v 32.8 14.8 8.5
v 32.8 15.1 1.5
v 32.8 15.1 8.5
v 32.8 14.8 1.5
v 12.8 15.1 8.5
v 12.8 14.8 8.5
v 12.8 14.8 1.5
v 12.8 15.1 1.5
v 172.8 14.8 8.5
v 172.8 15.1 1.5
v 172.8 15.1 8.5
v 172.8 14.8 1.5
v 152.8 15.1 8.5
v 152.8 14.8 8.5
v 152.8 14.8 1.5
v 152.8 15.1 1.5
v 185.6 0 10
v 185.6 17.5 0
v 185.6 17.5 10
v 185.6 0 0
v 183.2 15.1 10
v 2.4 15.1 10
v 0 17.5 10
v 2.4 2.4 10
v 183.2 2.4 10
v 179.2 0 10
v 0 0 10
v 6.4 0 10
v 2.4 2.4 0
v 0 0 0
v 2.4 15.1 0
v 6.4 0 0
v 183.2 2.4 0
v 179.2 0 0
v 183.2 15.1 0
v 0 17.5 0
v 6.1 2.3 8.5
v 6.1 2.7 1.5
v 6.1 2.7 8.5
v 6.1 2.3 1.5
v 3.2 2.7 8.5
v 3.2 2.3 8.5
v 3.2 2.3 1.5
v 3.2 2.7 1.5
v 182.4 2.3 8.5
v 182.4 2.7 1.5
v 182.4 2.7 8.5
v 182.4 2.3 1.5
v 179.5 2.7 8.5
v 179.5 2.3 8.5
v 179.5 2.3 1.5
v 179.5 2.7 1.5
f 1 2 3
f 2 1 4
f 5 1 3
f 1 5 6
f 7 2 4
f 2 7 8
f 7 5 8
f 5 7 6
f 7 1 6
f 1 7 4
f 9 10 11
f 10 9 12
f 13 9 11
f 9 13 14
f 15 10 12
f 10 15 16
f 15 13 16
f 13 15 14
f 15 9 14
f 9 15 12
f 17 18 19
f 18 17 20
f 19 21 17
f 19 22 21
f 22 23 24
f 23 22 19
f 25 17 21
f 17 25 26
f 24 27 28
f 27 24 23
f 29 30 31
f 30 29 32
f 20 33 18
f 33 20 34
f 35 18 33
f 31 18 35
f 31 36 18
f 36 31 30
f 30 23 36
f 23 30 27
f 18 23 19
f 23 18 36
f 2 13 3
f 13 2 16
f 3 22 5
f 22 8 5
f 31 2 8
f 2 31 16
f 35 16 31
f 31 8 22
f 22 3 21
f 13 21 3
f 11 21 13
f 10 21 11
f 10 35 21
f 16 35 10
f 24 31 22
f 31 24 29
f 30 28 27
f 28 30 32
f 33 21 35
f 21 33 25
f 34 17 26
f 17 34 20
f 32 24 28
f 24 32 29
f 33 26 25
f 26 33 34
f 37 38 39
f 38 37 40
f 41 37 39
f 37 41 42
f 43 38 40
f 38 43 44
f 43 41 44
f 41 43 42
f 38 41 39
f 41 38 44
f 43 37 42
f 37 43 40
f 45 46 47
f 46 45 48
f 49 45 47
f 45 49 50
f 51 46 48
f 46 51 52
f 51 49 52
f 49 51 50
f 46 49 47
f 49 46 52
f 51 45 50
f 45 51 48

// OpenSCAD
// SUPERSEDED BEFORE PRINT — DO NOT PRINT.
// Unified full-width retainer fit test for the populated electronics tray.
// Replaced by vertical-service-stand-front-retainer-fit-test.scad after the
// installation direction and screw-tab geometry were clarified.

$fn = 32;

tray_w = 180;
tray_t = 4;
upright_t = 8;

wall = 2.4;
width_clearance = 0.8;
depth_clearance = 0.7;
clip_h = 10;

inside_w = tray_w + width_clearance;
outside_w = inside_w + 2 * wall;
inside_depth = tray_t + upright_t + depth_clearance;
outside_depth = inside_depth + 2 * wall;

// Both populated edge bays leave 6 mm between the tray edge and the PCB.
// A 4 mm front tab therefore retains 2 mm nominal PCB clearance.
front_tab = 4;
retention_rib = 0.3;

// Approximate support centres relative to the left tray edge. Rear pads press
// only over the two black uprights; the connecting rear beam distributes load.
support_centres = [20, 160];
support_pad_w = 20;

module left_front_tab() {
    // Angled inner edge acts as a lead-in while the frame is pushed from the
    // rear toward the populated tray.
    linear_extrude(height = clip_h)
        polygon([
            [0, 0],
            [wall + front_tab, 0],
            [wall, wall],
            [0, wall]
        ]);
}

module unified_retainer_fit_test() {
    union() {
        // Full rear beam and two outer side walls form the main U.
        translate([0, wall + inside_depth, 0])
            cube([outside_w, wall, clip_h]);
        cube([wall, outside_depth, clip_h]);
        translate([outside_w - wall, 0, 0])
            cube([wall, outside_depth, clip_h]);

        // Short front tabs touch only the empty 6 mm tray-edge margins.
        left_front_tab();
        translate([outside_w, 0, 0]) mirror([1, 0, 0]) left_front_tab();

        // Front friction ribs stay inside the same clear edge margins.
        translate([wall + 0.8, wall - 0.1, 1.5])
            cube([front_tab - 1.1, retention_rib + 0.1, clip_h - 3]);
        translate([outside_w - wall - front_tab + 0.3,
                   wall - 0.1, 1.5])
            cube([front_tab - 1.1, retention_rib + 0.1, clip_h - 3]);

        // Rear pads remove clearance only above the two support locations.
        for (cx = support_centres)
            translate([wall + width_clearance / 2 + cx - support_pad_w / 2,
                       wall + inside_depth - retention_rib, 1.5])
                cube([support_pad_w, retention_rib + 0.1, clip_h - 3]);
    }
}

unified_retainer_fit_test();
